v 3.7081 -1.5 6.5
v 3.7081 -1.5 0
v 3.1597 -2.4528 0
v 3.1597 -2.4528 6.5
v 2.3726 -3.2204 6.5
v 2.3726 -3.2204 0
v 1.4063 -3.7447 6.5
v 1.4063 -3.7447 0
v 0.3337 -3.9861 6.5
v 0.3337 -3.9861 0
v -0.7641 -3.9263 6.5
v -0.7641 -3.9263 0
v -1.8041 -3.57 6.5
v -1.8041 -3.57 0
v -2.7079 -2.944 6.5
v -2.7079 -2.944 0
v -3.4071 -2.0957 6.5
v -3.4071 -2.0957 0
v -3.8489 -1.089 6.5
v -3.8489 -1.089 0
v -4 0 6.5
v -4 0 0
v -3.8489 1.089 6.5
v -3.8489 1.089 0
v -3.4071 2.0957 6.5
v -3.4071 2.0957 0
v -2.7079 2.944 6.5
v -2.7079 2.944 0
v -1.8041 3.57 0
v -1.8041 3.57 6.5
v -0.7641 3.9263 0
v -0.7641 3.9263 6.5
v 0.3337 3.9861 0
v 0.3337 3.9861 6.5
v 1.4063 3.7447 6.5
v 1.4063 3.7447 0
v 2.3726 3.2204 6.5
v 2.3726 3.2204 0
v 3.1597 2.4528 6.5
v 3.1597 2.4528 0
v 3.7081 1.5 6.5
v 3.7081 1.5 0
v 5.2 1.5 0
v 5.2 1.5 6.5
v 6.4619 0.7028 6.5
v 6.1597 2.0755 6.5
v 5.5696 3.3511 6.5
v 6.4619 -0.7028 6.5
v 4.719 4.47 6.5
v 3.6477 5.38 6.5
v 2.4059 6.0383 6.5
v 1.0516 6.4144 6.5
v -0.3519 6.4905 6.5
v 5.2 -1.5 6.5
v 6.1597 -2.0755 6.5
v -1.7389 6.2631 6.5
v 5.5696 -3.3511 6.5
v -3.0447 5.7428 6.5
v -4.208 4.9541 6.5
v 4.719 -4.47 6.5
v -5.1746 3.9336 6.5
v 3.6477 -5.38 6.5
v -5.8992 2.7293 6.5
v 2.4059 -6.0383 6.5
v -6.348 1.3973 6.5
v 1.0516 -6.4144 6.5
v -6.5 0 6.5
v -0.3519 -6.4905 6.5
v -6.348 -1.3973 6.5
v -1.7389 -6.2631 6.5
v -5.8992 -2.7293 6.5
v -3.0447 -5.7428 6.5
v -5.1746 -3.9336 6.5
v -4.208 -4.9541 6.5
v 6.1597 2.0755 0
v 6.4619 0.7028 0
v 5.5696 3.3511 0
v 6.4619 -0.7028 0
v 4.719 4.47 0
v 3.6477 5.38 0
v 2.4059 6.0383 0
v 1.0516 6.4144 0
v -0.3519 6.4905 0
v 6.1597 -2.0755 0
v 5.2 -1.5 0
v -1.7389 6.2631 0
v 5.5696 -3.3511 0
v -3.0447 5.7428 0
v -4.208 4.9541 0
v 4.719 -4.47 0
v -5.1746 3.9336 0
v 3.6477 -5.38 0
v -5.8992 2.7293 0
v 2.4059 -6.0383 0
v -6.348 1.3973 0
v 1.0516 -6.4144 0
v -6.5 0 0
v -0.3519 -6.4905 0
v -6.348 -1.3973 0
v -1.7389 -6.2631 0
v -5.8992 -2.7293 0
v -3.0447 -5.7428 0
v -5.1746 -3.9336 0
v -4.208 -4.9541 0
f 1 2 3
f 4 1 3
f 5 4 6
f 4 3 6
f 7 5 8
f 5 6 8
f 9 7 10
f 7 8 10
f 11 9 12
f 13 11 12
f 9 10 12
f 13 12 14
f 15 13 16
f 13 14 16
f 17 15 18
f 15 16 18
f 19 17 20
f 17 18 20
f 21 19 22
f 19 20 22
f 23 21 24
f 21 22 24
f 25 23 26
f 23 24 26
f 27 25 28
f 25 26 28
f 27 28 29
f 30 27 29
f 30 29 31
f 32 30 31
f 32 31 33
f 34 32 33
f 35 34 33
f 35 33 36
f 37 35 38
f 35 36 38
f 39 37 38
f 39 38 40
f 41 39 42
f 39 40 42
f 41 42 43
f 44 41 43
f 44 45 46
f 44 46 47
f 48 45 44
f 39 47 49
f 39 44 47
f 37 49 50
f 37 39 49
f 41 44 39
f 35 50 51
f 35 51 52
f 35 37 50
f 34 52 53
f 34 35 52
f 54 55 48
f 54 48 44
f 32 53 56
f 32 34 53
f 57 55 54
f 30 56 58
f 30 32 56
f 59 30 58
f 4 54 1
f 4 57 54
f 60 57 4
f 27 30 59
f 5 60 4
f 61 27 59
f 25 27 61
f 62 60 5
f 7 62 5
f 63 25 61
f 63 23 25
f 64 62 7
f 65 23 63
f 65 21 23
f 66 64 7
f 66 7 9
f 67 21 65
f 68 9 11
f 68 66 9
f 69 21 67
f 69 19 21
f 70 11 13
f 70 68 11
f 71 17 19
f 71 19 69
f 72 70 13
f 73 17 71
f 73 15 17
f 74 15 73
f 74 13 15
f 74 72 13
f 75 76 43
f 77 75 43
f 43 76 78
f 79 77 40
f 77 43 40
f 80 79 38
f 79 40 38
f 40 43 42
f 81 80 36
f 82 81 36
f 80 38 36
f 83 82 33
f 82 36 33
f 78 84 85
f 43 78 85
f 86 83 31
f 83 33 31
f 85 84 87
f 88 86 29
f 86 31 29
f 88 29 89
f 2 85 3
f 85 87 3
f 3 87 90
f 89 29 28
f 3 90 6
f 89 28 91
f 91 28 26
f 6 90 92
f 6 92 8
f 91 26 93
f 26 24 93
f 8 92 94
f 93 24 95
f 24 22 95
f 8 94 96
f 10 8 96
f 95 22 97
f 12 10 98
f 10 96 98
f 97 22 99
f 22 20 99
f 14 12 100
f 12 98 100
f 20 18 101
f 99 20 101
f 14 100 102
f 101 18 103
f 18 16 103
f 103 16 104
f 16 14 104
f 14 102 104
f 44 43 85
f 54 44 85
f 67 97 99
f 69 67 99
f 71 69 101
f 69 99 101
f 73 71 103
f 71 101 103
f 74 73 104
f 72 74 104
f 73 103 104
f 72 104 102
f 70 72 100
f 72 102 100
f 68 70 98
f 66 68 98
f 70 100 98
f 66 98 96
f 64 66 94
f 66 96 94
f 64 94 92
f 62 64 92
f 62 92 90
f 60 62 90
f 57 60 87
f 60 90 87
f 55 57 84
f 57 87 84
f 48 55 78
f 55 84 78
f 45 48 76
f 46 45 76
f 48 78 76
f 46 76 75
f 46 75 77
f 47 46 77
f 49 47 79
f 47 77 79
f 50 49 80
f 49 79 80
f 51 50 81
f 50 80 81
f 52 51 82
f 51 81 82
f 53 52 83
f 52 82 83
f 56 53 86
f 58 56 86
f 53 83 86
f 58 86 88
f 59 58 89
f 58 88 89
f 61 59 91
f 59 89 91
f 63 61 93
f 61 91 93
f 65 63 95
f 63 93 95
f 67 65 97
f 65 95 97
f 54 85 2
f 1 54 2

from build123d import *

# Parameters (mm, degrees)
SKETCH1_R           = 6.5
BOSS_EXTRUDE1_DEPTH = 6.5


with BuildPart() as part:
    # Sketch1 → Boss-Extrude1 (new body)
    with BuildSketch(Plane.XY):
        with Locations(Location((0, 0, 0), (0, 0, 180))):
            Circle(SKETCH1_R)
        with BuildLine():
            Line((5.2, -1.5), (3.708099244, -1.5))
            ThreePointArc((3.708099244, -1.5), (-4, 0), (3.708099244, 1.5))
            Line((3.708099244, 1.5), (5.2, 1.5))
            Line((5.2, 1.5), (5.2, -1.5))
        make_face(mode=Mode.SUBTRACT)
    extrude(amount=BOSS_EXTRUDE1_DEPTH)


solid = part.part
